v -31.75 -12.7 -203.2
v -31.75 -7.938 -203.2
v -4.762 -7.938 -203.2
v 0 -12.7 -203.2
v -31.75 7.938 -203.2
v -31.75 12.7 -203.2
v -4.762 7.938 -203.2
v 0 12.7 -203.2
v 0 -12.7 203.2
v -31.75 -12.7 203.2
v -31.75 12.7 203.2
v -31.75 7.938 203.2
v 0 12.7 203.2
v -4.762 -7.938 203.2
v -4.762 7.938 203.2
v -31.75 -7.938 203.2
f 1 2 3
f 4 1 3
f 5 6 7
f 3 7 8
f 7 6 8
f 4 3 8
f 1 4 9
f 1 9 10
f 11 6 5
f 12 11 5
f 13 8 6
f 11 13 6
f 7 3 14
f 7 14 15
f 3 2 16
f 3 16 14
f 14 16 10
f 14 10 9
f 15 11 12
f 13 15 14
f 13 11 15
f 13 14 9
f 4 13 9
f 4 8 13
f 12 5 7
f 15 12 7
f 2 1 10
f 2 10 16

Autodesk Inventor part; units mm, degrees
ref_plane "YZ Plane" through (0, 0, 0) normal (1, 0, 0) x (0, 1, 0)
ref_plane "XZ Plane" through (0, 0, 0) normal (0, 1, 0) x (-1, 0, 0)
ref_plane "XY Plane" through (0, 0, 0) normal (0, 0, 1) x (1, 0, 0)
sketch "Sketch1" plane through (0, 0, 0) normal (0, 0, 1) x (1, 0, 0)
  line L0 (0, 0) -> (0, 12.7)
  line L1 (0, 12.7) -> (-31.75, 12.7)
  line L2 (-31.75, 12.7) -> (-31.75, 7.9375)
  line L3 (-31.75, 7.9375) -> (-4.7625, 7.9375)
  line L4 (-4.7625, 7.9375) -> (-4.7625, 0)
  line L5 (0, 0) -> (0, -12.7)
  line L6 (0, -12.7) -> (-31.75, -12.7)
  line L7 (-31.75, -12.7) -> (-31.75, -7.9375)
  line L8 (-31.75, -7.9375) -> (-4.7625, -7.9375)
  line L9 (-4.7625, -7.9375) -> (-4.7625, 0)
  dimension "width" = 25.4
  dimension "thickness" = 4.7625
  dimension "d2" = 4.7625
  dimension "height" = 31.75
extrude "Extrusion1" add sketch "Sketch1" along normal mid plane 406.4
equation "\"d2\" = thickness"
properties part number "1 x 16 x 3_16" material "Aluminum 6061"
